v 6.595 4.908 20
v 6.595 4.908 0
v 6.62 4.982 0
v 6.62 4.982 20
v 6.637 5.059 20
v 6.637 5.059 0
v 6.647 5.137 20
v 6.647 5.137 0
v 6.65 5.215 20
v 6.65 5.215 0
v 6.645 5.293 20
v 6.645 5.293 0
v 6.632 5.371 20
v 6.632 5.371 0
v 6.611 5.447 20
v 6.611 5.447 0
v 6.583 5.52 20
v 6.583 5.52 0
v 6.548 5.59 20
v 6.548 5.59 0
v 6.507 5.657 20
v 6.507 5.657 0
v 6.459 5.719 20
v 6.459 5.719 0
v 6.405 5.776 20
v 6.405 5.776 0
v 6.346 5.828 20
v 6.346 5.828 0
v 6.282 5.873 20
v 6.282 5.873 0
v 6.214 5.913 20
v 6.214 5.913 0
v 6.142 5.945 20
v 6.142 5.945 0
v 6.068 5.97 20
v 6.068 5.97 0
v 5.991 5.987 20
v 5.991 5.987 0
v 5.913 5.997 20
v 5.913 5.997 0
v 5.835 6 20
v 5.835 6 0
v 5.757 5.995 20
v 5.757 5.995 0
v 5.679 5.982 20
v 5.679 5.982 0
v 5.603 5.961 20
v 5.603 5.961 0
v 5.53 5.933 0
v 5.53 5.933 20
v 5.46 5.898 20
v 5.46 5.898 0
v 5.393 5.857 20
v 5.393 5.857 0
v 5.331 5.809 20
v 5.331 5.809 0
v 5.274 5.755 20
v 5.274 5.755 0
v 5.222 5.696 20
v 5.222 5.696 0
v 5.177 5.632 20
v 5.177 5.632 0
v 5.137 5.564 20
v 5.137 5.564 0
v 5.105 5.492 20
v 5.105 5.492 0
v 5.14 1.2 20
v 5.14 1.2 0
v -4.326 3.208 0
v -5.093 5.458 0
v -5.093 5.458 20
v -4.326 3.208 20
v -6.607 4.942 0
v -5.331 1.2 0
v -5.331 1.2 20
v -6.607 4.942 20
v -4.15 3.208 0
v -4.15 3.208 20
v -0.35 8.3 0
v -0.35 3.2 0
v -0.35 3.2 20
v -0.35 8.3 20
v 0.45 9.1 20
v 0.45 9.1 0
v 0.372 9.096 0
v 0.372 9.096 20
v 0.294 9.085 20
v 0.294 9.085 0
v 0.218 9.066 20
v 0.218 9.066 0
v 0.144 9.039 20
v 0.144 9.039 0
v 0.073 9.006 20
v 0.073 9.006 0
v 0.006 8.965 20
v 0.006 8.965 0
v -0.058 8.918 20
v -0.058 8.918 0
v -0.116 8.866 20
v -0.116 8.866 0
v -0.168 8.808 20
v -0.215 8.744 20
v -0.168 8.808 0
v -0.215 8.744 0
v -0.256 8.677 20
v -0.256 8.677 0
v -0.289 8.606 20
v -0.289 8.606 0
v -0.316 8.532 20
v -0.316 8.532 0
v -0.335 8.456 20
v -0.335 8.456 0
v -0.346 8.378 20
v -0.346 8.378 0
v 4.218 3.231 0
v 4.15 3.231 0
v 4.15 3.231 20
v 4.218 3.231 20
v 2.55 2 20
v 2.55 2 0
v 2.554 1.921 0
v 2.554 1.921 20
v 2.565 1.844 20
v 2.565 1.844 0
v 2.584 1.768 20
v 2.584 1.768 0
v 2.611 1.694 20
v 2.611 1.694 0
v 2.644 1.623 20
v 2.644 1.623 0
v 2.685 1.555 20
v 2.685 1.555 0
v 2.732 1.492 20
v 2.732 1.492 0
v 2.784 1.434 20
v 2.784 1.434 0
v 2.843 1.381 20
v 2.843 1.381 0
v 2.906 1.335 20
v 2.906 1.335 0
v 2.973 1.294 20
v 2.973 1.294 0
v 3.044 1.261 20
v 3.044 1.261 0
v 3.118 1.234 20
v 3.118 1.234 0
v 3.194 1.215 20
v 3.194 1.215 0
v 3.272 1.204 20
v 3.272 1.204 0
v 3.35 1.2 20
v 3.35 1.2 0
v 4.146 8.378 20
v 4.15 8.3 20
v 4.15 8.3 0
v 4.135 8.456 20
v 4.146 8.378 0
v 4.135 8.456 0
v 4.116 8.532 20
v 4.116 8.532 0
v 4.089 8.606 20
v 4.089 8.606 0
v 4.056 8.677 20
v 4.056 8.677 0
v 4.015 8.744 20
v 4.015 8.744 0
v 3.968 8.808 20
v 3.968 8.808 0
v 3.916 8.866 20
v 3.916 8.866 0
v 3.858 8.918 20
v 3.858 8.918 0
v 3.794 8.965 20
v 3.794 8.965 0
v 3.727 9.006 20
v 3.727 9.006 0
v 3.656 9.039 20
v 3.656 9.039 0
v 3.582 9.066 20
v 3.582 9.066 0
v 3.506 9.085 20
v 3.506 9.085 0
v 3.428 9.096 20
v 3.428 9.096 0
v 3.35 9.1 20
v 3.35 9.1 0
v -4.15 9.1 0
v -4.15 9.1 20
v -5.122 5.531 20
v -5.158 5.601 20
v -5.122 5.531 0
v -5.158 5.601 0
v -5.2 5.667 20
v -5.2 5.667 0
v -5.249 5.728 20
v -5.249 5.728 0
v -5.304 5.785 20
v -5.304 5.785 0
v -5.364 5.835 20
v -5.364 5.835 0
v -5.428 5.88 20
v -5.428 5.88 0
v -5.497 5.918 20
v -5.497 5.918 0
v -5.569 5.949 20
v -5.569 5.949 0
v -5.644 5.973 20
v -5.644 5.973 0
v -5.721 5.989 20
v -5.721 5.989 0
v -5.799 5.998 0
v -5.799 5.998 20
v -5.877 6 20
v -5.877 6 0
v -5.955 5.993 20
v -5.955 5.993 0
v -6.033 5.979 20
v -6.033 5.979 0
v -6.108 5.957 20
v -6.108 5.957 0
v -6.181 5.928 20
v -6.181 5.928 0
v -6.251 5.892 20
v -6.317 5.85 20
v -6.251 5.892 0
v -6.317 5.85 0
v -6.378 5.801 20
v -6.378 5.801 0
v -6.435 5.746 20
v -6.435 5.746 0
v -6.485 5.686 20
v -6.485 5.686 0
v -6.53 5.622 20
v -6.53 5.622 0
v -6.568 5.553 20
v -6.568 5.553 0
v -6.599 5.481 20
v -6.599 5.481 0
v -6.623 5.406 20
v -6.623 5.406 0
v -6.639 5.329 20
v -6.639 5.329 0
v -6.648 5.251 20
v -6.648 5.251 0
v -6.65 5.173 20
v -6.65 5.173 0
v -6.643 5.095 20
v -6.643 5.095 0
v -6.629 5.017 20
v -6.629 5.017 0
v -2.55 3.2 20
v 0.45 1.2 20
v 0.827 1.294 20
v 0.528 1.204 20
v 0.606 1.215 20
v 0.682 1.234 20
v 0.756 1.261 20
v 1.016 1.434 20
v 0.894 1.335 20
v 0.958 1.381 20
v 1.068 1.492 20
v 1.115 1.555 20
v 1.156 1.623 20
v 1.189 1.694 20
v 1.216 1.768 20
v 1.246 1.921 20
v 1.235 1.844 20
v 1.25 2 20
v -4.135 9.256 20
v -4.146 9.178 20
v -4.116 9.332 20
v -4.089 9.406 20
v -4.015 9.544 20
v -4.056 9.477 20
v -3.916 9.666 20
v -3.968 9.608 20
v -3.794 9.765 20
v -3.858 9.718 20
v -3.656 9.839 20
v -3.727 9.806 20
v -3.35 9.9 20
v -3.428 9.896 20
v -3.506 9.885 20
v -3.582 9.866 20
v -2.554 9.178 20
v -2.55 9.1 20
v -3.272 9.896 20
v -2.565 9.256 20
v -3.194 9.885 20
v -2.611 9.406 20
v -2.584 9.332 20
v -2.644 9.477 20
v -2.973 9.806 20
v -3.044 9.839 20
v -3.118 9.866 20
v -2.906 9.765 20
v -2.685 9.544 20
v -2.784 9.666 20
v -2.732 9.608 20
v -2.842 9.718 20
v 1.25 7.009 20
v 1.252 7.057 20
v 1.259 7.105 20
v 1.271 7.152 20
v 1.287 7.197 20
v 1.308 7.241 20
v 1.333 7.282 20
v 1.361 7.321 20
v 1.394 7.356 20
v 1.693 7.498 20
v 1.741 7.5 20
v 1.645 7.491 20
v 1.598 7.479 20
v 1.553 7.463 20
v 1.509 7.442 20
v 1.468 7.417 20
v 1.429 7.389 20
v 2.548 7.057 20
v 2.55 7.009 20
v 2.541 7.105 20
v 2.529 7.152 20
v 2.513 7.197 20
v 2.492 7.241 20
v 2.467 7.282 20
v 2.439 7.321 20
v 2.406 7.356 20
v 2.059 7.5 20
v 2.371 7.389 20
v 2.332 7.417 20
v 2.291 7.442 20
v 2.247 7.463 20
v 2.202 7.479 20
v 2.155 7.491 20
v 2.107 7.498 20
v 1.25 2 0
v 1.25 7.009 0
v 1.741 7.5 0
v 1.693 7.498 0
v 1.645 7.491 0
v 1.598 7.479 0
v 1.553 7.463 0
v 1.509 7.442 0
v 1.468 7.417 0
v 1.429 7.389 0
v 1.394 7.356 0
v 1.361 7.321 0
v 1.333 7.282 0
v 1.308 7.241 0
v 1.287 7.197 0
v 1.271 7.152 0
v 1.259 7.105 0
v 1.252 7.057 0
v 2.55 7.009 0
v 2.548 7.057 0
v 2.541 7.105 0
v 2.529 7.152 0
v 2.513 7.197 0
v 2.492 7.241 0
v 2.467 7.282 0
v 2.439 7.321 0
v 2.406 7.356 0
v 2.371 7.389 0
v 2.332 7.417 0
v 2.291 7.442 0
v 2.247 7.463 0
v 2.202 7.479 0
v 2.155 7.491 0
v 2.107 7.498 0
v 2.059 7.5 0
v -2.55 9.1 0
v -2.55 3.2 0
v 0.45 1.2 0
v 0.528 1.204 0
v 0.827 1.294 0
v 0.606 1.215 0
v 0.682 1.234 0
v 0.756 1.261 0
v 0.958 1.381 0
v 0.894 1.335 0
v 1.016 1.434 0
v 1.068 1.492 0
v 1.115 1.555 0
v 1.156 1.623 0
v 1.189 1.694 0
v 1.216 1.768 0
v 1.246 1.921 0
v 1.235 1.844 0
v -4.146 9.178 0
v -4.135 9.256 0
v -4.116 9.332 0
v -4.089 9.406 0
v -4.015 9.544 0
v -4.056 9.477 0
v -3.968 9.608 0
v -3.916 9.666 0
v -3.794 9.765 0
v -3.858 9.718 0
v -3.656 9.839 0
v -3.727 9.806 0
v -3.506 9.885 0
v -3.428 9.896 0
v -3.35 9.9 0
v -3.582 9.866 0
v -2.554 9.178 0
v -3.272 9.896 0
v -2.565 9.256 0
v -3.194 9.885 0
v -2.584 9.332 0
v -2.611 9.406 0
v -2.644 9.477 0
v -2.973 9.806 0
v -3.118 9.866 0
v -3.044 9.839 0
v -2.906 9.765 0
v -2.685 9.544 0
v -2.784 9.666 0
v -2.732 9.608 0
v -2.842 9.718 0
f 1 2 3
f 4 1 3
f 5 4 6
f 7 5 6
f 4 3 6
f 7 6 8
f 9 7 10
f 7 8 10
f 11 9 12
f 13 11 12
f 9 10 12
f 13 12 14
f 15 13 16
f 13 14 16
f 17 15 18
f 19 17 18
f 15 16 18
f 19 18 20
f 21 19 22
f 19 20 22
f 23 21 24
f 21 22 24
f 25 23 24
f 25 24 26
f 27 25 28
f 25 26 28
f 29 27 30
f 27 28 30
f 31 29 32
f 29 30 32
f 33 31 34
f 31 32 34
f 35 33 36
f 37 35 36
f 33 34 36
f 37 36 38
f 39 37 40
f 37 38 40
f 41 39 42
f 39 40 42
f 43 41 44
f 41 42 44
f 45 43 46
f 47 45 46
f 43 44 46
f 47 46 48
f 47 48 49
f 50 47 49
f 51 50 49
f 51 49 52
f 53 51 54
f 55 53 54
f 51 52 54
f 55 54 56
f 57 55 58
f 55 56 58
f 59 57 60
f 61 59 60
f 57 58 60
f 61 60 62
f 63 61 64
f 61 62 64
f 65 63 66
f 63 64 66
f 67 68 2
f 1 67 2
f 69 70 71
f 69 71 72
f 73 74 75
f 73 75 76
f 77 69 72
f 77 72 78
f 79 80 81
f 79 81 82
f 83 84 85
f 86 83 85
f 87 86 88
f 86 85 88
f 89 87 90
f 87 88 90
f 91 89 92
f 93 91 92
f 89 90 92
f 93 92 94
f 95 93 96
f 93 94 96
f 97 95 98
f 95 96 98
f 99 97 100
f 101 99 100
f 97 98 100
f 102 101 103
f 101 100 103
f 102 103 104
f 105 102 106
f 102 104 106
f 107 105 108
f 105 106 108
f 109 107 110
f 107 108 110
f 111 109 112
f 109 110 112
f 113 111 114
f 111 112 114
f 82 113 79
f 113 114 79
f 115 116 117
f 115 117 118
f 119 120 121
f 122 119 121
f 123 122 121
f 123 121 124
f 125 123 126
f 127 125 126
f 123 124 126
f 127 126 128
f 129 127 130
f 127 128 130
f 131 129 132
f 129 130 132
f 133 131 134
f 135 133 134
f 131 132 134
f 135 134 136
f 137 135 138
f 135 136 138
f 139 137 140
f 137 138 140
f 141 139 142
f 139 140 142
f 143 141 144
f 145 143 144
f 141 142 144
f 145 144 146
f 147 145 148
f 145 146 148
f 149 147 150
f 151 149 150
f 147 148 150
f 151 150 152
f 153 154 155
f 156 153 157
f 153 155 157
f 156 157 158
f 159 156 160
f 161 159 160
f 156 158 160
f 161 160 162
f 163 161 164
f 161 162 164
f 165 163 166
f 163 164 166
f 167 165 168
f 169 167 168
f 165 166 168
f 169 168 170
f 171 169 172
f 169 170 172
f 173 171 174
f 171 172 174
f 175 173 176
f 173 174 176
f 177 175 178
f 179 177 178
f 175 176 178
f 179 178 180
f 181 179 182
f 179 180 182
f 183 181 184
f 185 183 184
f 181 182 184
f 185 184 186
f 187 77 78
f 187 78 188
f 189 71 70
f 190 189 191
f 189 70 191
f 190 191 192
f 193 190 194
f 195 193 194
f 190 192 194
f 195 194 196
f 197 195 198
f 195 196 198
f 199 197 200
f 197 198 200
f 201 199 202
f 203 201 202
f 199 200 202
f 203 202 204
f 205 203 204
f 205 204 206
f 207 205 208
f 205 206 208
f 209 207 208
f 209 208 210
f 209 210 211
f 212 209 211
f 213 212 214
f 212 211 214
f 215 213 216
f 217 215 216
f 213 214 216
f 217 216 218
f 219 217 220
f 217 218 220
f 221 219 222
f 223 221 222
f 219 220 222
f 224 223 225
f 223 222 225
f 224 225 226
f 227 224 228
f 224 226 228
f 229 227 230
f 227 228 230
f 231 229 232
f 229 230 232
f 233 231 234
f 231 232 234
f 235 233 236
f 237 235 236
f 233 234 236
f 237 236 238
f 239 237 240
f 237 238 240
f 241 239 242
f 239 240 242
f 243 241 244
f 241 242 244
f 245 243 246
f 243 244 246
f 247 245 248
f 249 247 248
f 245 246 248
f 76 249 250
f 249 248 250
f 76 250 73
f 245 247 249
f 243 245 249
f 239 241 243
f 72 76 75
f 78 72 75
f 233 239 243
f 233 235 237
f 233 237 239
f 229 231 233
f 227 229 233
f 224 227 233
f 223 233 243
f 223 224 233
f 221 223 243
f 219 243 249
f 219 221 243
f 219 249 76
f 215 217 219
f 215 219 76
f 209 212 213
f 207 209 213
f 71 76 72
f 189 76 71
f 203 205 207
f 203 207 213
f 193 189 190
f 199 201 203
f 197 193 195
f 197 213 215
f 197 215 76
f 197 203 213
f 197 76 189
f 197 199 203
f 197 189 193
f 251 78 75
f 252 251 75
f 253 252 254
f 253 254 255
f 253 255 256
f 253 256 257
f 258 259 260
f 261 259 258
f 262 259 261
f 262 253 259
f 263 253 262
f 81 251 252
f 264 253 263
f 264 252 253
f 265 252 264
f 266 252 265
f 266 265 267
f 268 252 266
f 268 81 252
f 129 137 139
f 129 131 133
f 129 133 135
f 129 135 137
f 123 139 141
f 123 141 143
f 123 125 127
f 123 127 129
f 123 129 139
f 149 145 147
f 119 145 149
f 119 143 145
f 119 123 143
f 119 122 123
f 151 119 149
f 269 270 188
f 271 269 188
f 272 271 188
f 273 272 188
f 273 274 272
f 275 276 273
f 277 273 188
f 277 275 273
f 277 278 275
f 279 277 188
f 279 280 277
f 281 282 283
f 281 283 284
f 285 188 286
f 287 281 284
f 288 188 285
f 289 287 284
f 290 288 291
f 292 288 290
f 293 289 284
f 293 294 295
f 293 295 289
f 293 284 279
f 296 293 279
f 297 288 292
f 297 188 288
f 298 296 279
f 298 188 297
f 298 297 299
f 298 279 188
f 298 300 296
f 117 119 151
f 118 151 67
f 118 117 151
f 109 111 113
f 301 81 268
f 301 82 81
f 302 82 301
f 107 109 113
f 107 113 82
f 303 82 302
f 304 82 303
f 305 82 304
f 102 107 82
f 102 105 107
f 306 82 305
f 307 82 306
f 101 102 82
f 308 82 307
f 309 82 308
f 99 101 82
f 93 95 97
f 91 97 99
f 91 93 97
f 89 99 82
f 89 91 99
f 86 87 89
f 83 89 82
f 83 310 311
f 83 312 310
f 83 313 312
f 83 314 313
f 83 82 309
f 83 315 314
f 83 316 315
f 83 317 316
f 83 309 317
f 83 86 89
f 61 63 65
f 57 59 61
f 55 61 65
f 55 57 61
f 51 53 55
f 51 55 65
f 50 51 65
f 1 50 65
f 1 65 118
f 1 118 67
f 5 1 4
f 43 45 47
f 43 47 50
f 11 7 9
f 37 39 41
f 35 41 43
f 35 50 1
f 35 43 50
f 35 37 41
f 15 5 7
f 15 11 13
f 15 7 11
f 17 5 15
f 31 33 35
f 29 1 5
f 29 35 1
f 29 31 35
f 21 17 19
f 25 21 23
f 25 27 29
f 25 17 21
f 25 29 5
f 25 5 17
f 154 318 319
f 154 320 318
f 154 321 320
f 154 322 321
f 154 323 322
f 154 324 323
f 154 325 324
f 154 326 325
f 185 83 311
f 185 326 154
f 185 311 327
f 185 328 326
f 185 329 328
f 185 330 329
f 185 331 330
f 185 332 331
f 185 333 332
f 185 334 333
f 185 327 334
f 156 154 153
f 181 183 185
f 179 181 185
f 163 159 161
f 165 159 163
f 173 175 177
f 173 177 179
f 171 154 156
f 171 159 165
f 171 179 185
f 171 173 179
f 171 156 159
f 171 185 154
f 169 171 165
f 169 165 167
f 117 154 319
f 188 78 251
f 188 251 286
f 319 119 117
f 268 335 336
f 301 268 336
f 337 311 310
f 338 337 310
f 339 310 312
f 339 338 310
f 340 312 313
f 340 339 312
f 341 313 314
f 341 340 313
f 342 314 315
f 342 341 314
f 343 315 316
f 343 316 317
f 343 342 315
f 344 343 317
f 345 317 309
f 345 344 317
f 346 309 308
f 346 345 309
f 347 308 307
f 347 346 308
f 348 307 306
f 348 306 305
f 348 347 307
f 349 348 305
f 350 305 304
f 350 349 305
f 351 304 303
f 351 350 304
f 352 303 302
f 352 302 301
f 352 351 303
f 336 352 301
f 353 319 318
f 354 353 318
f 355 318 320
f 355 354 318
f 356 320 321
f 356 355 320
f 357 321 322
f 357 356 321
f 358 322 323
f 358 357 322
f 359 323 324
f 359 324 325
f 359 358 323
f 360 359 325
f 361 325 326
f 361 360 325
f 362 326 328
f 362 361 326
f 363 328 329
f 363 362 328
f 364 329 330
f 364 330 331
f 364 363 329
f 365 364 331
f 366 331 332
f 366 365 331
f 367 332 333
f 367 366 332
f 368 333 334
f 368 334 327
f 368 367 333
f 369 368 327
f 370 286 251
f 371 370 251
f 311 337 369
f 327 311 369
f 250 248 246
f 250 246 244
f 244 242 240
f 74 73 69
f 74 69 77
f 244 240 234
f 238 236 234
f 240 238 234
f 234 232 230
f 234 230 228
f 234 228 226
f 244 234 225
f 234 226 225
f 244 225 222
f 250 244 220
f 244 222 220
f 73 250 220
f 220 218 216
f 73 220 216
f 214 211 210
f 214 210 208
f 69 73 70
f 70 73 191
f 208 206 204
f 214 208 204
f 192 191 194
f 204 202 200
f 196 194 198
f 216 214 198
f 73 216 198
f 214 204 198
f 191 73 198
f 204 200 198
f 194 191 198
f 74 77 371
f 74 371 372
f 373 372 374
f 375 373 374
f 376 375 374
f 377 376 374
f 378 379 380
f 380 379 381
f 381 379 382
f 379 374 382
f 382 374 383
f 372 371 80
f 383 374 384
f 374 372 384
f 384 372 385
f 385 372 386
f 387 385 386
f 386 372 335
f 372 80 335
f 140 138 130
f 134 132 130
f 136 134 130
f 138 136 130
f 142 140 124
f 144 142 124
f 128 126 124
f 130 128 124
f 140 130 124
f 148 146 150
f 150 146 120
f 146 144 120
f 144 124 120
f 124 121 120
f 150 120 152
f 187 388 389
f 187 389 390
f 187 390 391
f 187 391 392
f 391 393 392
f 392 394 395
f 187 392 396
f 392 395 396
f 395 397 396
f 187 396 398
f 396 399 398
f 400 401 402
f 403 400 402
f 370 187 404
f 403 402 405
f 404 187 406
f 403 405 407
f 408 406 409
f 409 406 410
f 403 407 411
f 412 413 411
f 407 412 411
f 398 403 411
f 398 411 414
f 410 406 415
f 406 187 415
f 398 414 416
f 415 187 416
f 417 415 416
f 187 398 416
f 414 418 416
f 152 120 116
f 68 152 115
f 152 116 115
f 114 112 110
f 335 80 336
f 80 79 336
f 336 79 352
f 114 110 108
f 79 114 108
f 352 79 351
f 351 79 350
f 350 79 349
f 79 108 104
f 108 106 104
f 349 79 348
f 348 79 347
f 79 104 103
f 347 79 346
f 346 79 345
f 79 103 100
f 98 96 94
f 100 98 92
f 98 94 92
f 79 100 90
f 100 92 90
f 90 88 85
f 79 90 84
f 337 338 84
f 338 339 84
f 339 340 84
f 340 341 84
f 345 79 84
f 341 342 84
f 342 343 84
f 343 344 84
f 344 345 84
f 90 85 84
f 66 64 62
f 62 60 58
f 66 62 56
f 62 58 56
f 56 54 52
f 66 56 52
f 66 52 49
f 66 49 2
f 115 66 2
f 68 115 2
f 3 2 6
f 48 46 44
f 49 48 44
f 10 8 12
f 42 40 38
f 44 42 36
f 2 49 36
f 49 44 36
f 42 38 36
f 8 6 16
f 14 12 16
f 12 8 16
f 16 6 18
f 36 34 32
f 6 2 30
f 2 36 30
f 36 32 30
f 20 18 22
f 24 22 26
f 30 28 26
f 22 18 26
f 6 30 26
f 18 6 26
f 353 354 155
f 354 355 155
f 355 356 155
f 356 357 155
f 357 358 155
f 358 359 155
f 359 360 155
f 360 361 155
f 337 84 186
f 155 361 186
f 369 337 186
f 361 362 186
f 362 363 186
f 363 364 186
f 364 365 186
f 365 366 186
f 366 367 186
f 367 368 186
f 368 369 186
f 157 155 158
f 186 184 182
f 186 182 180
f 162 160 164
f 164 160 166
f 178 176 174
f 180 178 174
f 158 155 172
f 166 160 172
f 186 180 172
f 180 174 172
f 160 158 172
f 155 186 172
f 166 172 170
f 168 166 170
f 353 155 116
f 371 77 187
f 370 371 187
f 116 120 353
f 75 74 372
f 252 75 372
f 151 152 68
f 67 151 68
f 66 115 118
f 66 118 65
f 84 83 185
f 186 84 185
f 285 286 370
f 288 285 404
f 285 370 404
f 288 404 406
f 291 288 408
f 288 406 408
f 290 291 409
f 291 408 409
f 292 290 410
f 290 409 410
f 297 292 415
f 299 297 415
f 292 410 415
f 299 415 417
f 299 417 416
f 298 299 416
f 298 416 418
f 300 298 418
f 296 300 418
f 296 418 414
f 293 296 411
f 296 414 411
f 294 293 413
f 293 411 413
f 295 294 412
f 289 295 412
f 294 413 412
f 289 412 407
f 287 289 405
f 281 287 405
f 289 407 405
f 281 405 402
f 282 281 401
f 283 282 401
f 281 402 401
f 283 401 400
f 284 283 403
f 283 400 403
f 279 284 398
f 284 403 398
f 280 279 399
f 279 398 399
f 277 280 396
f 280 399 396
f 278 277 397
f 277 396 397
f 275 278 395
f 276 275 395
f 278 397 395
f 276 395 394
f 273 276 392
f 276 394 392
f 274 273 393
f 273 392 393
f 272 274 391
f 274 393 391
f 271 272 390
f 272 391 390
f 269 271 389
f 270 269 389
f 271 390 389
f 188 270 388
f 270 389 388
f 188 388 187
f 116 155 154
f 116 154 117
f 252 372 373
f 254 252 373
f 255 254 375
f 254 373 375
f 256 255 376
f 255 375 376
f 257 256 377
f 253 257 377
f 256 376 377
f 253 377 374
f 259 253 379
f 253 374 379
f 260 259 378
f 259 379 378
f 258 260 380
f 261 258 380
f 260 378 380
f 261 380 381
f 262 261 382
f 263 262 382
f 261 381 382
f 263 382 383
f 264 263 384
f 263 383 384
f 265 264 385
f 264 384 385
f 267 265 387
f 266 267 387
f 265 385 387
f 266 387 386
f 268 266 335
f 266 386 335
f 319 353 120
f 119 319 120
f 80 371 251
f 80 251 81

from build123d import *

# Parameters (mm, degrees)
PAD_DEPTH = 20


with BuildPart() as part:
    # Sketch → Pad (new body)
    with BuildSketch(Plane.XY):
        with BuildLine():
            Line((5.140364, 1.2), (6.594756, 4.907874))
            ThreePointArc((6.594756, 4.907874), (6.142126, 5.944756), (5.105244, 5.492126))
            Line((4.218492, 3.231414), (5.105244, 5.492126))
            Line((4.15, 3.231414), (4.218492, 3.231414))
            Line((4.15, 8.3), (4.15, 3.231414))
            ThreePointArc((4.15, 8.3), (3.915685, 8.865685), (3.35, 9.1))
            Line((0.45, 9.1), (3.35, 9.1))
            ThreePointArc((0.45, 9.1), (-0.115685, 8.865685), (-0.35, 8.3))
            Line((-0.35, 3.199929), (-0.35, 8.3))
            Line((-2.55, 3.199929), (-0.35, 3.199929))
            Line((-2.55, 9.1), (-2.55, 3.199929))
            ThreePointArc((-2.55, 9.1), (-3.35, 9.9), (-4.15, 9.1))
            Line((-4.15, 3.208053), (-4.15, 9.1))
            Line((-4.325596, 3.208053), (-4.15, 3.208053))
            Line((-5.092804, 5.458176), (-4.325596, 3.208053))
            ThreePointArc((-5.092804, 5.458176), (-6.108176, 5.957196), (-6.607196, 4.941824))
            Line((-5.331372, 1.2), (-6.607196, 4.941824))
            Line((-5.331372, 1.2), (0.449979, 1.199852))
            ThreePointArc((0.449979, 1.199852), (1.015678, 1.434159), (1.25, 1.999852))
            Line((1.25, 1.999852), (1.25, 7.009087))
            ThreePointArc((1.740913, 7.5), (1.393785, 7.356215), (1.25, 7.009087))
            Line((1.740913, 7.5), (2.059087, 7.5))
            ThreePointArc((2.55, 7.009087), (2.406215, 7.356215), (2.059087, 7.5))
            Line((2.55, 7.009087), (2.55, 1.99987))
            ThreePointArc((2.55, 1.99987), (2.784335, 1.434164), (3.350058, 1.19987))
            Line((3.350058, 1.19987), (5.140364, 1.2))
        make_face()
    extrude(amount=PAD_DEPTH)


solid = part.part
